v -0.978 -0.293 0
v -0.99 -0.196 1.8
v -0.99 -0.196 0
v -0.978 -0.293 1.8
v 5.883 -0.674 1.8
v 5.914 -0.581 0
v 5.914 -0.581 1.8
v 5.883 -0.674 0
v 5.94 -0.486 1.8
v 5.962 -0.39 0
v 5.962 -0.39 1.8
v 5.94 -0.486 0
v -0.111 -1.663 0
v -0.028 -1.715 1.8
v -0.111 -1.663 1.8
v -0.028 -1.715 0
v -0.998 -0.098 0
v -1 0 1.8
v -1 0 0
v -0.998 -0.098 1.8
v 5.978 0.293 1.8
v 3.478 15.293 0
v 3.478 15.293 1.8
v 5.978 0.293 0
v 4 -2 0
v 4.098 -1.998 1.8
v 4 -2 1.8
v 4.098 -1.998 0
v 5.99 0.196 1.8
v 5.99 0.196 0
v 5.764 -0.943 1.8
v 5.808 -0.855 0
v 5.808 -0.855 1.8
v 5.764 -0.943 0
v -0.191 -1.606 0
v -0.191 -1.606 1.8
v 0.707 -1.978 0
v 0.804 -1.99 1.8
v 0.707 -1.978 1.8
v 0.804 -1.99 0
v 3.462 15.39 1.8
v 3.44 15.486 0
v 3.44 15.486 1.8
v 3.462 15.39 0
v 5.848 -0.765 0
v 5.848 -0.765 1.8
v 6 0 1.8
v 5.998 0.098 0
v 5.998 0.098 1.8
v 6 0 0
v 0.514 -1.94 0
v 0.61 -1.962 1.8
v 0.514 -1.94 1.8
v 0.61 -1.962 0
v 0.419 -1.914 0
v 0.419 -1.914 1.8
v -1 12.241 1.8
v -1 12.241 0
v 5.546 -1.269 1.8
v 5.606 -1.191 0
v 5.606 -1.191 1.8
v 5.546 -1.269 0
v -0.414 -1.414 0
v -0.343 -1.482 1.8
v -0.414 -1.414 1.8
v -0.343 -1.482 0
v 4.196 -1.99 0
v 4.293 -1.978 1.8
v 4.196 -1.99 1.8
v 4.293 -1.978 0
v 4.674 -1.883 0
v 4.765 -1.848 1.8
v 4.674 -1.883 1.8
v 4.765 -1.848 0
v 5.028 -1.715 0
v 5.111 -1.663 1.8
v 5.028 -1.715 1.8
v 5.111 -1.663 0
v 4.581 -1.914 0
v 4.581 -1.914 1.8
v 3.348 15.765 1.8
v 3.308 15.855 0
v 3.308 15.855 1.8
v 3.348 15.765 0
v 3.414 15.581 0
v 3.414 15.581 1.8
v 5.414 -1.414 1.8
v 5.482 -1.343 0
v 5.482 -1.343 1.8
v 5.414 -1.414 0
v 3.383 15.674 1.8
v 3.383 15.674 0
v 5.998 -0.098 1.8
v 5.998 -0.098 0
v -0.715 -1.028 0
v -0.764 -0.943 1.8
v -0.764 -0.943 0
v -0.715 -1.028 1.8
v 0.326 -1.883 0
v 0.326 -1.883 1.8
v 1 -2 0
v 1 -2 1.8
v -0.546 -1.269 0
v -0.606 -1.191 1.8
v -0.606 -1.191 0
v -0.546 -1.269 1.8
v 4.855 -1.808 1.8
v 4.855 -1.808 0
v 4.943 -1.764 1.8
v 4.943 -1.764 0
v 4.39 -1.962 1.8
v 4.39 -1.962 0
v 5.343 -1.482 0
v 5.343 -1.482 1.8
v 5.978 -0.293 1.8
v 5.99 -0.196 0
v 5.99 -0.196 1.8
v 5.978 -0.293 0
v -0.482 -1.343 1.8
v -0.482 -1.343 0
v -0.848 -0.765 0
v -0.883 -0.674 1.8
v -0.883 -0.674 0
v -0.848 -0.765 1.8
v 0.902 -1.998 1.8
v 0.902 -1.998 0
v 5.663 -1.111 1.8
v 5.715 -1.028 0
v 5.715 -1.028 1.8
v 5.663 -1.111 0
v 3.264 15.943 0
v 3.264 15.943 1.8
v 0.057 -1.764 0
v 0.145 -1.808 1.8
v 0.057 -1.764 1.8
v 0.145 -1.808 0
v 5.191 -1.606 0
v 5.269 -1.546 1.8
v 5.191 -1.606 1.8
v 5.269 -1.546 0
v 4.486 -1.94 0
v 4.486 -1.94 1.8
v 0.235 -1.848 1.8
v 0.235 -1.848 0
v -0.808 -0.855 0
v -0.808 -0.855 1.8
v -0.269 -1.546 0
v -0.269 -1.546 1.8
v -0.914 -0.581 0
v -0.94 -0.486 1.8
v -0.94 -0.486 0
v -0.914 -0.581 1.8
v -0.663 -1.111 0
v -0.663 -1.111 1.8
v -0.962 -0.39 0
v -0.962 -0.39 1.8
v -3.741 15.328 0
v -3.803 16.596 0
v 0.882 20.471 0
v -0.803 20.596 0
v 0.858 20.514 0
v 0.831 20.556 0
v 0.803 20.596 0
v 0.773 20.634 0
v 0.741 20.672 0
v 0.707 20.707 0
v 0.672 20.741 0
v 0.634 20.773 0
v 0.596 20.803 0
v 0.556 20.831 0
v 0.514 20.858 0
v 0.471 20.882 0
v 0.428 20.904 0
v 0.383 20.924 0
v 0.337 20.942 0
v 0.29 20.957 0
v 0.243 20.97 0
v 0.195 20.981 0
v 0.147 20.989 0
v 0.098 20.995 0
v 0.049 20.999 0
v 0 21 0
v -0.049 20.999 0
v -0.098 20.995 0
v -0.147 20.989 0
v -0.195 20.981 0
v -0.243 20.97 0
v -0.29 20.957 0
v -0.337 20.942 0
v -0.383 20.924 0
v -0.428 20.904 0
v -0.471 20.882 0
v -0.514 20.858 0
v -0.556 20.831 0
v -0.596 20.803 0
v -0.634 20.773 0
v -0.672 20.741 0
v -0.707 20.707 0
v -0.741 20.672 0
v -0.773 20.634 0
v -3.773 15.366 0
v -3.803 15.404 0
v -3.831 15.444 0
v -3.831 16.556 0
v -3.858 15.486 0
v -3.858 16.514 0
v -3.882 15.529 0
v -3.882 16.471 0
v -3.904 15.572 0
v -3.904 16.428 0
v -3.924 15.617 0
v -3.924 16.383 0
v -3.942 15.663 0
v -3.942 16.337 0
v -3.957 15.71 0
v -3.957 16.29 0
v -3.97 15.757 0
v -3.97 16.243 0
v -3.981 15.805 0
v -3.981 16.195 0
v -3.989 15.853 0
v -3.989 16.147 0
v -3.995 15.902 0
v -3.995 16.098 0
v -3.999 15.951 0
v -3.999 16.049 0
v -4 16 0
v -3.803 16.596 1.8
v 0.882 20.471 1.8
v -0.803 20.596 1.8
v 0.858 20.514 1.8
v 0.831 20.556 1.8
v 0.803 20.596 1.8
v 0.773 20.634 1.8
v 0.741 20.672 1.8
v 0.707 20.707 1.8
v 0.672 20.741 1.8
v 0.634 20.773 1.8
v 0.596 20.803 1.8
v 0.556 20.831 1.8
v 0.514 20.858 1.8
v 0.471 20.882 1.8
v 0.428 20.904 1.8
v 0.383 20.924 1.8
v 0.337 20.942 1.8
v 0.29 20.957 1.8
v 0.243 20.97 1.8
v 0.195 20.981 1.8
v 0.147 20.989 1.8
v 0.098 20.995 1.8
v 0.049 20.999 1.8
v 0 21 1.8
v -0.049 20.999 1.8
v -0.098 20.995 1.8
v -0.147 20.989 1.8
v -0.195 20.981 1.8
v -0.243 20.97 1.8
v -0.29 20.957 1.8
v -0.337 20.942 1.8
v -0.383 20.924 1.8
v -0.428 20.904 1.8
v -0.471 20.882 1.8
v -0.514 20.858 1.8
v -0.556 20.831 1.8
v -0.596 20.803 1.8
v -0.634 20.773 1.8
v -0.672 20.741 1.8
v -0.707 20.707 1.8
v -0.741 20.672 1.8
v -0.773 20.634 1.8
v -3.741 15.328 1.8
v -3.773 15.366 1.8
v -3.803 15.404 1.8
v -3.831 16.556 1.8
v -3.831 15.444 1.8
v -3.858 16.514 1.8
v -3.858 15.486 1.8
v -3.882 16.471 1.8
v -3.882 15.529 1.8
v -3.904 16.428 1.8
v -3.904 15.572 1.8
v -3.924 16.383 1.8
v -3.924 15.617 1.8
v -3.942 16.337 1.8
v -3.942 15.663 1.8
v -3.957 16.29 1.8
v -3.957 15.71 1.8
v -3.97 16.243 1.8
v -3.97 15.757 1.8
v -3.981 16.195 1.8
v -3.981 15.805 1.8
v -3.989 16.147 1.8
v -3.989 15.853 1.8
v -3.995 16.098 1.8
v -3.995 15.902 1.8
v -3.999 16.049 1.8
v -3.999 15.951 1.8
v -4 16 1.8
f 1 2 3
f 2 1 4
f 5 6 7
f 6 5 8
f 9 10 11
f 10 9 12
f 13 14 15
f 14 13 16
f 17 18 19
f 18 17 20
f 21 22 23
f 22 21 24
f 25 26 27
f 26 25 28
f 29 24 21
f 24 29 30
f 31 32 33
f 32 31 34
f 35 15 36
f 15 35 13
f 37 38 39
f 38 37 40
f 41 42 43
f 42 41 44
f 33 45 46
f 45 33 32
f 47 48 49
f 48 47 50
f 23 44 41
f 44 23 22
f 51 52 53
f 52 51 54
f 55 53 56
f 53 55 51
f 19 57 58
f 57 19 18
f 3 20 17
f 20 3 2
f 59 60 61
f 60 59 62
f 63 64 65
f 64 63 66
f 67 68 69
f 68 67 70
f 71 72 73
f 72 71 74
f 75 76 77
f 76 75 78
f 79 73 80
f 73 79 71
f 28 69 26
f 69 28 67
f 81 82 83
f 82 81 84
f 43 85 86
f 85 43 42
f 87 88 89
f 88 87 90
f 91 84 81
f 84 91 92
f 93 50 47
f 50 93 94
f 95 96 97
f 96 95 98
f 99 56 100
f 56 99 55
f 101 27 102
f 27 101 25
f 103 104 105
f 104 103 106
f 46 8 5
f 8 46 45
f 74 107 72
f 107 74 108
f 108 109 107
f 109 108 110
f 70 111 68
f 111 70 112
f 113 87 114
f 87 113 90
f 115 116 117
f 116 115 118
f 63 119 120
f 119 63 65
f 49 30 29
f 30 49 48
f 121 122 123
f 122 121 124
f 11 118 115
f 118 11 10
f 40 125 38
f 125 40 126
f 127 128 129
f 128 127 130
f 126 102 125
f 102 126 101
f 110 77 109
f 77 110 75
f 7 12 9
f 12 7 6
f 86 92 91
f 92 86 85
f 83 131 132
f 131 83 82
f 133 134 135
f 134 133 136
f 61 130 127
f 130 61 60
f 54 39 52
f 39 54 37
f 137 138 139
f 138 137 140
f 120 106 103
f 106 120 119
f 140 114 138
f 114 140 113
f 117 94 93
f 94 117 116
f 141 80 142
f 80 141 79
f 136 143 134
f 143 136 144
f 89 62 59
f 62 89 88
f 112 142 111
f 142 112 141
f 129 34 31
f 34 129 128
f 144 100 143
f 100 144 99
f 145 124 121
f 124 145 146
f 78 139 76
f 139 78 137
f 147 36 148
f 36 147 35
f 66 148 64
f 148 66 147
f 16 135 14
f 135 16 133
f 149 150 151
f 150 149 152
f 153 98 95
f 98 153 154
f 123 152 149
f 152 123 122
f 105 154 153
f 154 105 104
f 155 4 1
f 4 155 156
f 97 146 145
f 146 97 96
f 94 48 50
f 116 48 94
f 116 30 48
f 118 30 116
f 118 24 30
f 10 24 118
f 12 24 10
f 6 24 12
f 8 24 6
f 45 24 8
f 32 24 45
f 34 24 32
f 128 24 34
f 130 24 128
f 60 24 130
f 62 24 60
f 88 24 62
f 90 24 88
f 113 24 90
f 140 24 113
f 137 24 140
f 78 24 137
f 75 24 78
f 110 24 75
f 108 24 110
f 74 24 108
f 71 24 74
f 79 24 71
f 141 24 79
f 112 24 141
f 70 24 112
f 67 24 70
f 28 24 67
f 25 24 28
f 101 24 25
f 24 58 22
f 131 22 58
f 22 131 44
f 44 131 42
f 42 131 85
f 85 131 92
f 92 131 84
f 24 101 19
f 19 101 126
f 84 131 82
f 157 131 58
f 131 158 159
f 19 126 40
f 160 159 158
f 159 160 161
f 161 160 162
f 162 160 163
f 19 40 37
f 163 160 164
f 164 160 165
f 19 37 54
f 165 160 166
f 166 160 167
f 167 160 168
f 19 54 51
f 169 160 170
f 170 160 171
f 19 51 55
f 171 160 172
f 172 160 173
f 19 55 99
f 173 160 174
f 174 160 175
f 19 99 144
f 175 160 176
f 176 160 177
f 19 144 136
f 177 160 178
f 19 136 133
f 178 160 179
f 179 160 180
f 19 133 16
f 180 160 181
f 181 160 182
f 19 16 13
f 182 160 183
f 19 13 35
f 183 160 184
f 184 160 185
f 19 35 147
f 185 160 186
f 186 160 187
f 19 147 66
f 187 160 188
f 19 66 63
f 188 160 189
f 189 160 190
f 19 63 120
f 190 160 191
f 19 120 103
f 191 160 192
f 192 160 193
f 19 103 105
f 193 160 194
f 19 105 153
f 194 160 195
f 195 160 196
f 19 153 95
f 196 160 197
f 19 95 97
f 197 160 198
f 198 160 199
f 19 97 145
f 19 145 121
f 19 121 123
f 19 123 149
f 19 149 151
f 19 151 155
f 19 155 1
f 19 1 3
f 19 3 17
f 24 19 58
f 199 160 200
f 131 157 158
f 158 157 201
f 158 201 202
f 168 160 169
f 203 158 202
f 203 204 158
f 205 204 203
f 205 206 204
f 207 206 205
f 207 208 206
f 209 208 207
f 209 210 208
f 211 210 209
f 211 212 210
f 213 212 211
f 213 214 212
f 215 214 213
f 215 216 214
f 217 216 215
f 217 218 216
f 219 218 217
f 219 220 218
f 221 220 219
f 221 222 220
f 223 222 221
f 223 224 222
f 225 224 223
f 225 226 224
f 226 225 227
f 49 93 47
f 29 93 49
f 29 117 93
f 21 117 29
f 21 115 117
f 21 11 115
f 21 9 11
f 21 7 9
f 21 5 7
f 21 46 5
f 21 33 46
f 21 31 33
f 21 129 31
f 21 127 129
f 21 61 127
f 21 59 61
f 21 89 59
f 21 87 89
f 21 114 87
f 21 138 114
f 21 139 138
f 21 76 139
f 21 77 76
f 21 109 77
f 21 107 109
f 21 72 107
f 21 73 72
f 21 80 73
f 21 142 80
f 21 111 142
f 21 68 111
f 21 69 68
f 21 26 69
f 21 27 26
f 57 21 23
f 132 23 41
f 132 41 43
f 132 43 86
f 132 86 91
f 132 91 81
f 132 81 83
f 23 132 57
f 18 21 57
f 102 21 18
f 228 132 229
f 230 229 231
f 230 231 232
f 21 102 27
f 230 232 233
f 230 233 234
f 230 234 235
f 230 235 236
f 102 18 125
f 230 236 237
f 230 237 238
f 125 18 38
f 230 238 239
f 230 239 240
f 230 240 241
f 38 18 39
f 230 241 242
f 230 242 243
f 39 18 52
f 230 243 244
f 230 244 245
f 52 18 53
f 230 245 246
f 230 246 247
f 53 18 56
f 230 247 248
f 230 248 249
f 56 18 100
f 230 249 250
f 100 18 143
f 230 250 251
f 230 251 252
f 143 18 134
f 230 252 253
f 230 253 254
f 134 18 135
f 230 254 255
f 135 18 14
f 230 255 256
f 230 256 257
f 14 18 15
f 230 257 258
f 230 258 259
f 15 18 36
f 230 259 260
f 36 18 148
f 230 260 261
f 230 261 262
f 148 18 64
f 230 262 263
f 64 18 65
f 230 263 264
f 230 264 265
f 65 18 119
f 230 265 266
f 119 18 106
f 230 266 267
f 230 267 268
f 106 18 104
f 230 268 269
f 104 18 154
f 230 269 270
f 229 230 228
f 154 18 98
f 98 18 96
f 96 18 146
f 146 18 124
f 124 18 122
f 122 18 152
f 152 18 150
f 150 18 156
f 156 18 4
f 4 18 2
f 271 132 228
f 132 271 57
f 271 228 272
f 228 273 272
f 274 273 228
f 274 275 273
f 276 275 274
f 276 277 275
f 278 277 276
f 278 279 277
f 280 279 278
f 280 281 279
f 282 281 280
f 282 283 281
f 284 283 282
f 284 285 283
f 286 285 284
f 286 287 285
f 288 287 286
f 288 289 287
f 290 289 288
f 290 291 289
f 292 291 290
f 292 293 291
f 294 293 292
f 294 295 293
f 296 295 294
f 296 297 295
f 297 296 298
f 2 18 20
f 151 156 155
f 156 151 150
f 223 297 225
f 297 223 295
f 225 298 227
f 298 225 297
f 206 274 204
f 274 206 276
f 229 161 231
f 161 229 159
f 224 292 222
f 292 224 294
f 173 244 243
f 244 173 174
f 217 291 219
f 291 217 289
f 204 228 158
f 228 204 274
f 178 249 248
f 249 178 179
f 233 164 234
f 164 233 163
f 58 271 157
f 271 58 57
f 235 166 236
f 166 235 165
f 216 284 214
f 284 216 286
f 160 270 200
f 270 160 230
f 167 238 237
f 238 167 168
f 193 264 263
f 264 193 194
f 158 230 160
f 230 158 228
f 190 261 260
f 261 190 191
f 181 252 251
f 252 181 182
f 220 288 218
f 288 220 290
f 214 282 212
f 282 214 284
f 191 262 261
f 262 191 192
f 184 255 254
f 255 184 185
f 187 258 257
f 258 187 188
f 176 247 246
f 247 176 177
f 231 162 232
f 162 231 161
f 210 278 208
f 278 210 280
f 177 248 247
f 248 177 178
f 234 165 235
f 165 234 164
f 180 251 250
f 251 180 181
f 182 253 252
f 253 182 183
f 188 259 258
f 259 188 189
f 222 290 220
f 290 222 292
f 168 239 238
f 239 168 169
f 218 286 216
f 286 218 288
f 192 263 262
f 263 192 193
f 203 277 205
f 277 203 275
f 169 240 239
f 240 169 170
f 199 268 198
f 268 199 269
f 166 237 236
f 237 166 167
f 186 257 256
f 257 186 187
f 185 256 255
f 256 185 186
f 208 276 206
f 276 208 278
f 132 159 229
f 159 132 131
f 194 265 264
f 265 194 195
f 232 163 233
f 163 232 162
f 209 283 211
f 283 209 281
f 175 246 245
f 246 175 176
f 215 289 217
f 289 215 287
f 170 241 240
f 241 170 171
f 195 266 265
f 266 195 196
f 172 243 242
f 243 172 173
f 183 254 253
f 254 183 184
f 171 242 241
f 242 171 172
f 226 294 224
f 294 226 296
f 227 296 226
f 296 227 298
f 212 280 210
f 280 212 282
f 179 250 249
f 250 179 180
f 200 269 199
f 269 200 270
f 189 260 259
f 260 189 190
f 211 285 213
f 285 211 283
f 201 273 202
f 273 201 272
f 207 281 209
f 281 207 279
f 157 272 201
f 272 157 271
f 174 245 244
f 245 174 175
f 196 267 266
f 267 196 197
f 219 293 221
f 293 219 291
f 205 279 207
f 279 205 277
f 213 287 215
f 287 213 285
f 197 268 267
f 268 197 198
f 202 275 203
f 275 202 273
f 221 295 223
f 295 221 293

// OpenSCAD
lh=0.13125;
lw=0.35;

$fn=128;

//clone_mirror([0,1,0])
union() {
  difference() {
    polyhedron(
      points=[
        [0,0,0],     // 0
        [-85,0,0],   // 1
        [-75,5,0],
        [0,3,0],
        [0,0,2],     // 4
        [-73,0,2]],
      faces=[
        [0,1,2,3],
        [0,1,5,4],
        [1,2,5],
        [2,3,4,5],
        [0,3,4]]);
    hull() {
      translate([0,0,3]) sphere(2);
      translate([0,0,5]) sphere(2);
      translate([-75,0,3]) sphere(2);
      translate([-75,0,5]) sphere(2);
    }
  }
  linear_extrude(1.8) hull() {
    translate([1,0]) circle(2);
    translate([1,13]) circle(2);
    translate([1.5,15]) circle(2);
    translate([4,0]) circle(2);
  }
  linear_extrude(1.8) hull() {
    translate([1,13]) circle(2);
    translate([-3,16]) circle(1);
    translate([0,20]) circle(1);
    translate([1.5,15]) circle(2);
  }
}

module clone_mirror(v) {
  union() {
    children();
    mirror(v) children();
  }
}
